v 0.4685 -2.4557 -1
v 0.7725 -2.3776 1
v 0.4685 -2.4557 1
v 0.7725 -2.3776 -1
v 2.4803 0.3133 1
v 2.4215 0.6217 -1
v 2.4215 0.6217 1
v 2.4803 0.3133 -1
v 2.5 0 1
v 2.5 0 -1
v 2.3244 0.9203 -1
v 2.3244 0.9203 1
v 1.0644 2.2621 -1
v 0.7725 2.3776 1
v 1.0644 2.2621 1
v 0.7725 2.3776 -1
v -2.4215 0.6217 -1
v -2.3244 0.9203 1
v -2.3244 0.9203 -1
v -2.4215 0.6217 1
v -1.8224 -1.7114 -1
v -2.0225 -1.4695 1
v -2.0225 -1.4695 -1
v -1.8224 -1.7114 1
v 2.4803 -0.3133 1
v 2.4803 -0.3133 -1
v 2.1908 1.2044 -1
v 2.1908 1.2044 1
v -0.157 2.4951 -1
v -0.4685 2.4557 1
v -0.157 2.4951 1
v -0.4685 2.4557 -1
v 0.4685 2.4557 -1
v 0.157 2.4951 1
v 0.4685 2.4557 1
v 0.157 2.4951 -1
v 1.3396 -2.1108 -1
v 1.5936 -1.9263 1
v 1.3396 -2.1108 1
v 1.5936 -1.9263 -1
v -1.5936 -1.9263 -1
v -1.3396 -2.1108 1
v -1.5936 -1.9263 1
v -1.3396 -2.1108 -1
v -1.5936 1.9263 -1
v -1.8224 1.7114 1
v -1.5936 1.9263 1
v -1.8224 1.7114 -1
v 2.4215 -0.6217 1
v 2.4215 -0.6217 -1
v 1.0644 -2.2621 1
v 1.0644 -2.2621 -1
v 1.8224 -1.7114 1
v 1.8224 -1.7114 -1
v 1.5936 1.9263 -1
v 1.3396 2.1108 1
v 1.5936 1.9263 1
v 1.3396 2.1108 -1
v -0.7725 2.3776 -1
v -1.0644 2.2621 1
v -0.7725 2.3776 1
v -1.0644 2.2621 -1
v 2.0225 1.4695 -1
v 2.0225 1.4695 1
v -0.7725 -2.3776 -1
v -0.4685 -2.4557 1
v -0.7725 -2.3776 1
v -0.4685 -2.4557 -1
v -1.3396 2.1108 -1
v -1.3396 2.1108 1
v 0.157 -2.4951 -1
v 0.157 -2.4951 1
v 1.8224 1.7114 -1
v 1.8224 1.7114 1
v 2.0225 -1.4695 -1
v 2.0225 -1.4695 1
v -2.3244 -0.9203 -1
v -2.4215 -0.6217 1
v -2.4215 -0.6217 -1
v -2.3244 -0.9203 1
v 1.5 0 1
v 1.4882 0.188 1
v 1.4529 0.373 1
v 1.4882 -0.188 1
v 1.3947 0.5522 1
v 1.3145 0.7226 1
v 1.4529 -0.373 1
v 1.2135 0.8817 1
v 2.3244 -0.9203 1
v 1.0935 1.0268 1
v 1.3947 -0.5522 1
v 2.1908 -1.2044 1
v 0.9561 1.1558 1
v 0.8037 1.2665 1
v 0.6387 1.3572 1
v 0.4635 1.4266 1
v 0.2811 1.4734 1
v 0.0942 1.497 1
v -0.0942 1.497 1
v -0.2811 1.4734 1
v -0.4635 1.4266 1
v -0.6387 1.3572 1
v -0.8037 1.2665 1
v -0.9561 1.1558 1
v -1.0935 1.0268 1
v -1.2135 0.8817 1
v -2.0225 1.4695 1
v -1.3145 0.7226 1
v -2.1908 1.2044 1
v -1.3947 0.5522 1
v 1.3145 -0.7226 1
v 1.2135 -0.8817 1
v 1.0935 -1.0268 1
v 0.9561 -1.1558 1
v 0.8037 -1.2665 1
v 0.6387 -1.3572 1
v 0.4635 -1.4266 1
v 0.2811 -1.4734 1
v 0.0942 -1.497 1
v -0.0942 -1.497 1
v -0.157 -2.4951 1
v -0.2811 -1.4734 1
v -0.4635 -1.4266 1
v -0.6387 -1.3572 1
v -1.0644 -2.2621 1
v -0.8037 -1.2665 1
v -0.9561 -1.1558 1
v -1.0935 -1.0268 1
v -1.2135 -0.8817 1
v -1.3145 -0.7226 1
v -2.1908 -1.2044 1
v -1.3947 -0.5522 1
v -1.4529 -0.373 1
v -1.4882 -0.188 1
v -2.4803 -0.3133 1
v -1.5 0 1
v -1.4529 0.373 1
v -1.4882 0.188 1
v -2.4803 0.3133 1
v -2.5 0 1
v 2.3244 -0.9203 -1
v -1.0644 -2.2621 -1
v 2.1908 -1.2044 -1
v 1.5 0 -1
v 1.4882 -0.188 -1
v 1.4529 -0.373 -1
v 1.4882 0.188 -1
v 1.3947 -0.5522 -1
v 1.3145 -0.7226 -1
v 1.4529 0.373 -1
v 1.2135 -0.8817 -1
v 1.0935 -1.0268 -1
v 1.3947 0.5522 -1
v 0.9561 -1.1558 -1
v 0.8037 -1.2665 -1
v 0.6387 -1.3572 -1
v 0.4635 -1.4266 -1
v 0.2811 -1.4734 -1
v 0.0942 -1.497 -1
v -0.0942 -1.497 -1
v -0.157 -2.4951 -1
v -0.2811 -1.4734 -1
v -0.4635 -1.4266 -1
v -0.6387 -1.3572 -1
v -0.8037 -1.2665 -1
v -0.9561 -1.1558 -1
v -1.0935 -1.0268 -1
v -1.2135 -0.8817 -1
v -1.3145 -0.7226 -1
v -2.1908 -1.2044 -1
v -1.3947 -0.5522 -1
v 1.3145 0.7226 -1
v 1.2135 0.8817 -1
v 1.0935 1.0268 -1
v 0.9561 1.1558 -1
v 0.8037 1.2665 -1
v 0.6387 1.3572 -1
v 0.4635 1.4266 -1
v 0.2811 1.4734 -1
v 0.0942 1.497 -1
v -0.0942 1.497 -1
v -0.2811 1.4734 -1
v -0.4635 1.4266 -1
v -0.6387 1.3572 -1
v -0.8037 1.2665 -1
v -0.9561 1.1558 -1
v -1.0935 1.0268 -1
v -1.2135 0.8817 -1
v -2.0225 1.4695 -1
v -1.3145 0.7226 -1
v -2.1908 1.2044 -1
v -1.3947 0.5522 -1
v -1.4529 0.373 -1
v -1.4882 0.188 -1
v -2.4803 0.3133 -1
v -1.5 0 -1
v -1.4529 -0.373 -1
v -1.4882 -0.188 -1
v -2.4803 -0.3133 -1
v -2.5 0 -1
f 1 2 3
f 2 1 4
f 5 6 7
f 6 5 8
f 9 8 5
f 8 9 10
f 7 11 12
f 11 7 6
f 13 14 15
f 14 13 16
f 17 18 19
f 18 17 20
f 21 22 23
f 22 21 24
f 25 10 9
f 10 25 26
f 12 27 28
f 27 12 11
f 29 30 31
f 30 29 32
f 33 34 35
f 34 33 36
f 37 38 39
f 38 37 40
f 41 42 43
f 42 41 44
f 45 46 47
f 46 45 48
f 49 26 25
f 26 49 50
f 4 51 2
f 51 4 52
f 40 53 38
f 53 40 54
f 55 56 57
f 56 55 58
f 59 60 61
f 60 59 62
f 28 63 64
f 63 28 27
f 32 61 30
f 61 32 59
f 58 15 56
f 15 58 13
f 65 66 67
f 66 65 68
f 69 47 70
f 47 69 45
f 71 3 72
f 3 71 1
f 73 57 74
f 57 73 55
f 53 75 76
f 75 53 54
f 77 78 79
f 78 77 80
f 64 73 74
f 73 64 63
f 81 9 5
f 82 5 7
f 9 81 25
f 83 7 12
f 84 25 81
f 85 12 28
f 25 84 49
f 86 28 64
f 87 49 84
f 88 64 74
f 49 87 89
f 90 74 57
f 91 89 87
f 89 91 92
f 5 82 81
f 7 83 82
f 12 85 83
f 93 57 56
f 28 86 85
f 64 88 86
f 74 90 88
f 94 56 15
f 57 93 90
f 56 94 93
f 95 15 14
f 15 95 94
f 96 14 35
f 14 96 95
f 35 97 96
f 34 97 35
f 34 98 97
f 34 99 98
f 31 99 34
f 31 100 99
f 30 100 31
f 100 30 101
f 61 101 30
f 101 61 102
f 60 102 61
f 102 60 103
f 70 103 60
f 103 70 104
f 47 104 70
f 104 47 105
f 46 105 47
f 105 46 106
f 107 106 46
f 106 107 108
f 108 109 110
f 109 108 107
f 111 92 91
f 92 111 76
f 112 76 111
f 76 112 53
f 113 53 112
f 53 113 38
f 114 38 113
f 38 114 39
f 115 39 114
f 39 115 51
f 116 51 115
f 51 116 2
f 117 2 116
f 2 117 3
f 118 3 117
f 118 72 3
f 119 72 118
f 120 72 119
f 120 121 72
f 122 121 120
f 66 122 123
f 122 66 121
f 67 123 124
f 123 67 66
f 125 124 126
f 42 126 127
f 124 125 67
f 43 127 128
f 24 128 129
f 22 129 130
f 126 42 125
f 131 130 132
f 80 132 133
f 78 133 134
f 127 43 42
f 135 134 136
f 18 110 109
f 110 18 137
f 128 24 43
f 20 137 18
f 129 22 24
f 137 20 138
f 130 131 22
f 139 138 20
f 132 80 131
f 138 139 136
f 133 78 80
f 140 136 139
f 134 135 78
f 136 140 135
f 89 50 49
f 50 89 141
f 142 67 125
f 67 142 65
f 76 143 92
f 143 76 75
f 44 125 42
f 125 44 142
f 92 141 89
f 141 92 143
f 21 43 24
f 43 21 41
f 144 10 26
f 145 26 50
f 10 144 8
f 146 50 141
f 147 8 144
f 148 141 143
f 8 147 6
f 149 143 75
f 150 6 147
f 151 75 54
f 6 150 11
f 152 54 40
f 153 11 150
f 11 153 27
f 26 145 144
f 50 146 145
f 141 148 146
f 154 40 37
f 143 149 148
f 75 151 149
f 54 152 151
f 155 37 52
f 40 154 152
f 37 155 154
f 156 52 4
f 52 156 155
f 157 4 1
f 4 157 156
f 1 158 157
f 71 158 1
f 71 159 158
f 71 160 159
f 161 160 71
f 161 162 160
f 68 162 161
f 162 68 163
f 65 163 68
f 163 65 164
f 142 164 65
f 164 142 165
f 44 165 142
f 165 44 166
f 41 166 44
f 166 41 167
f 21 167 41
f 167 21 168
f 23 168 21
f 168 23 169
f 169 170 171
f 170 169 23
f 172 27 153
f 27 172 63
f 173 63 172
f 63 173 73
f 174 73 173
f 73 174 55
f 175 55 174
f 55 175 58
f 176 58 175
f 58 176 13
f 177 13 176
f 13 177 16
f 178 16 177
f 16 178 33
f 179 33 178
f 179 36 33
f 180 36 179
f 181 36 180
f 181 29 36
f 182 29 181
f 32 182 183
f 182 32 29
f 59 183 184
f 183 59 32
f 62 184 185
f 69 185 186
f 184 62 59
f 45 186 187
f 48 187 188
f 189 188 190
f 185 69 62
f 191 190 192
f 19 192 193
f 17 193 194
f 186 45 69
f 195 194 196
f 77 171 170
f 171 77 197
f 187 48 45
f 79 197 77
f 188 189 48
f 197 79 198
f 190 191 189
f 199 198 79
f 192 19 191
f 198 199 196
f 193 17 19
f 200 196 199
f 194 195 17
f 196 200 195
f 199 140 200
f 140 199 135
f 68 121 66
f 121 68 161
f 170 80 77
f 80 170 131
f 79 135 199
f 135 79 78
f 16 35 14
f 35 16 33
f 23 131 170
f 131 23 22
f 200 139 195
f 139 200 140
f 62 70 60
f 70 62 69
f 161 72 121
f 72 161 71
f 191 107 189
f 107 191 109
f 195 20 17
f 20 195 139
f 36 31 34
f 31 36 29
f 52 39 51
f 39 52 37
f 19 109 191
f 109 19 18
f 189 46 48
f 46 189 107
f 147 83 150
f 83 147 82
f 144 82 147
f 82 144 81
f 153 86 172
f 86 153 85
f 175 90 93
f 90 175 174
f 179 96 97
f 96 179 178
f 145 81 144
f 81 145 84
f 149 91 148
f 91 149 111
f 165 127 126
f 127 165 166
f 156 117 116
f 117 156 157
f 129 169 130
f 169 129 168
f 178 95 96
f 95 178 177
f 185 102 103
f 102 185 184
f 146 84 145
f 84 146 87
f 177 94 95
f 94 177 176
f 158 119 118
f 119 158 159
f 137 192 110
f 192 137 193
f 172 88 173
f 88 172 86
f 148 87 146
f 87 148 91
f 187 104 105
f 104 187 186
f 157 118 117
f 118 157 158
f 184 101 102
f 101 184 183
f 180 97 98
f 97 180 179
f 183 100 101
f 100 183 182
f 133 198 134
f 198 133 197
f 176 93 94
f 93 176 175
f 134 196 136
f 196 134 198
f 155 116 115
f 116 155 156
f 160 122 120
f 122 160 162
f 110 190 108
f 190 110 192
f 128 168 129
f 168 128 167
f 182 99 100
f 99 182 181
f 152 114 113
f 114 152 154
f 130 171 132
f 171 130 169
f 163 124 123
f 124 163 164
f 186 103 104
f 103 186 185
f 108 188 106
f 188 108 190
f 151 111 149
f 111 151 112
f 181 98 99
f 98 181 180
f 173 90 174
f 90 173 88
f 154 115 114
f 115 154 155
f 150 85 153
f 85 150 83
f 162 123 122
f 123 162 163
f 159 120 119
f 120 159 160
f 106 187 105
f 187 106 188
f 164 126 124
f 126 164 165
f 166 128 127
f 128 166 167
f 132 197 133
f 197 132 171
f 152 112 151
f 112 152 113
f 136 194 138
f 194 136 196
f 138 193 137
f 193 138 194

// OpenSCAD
$fn = 50;


difference() {
	union() {
		translate(v = [0, 0, -1.0000000000]) {
			cylinder(h = 2, r = 2.5000000000);
		}
	}
	union() {
		translate(v = [0, 0, -100.0000000000]) {
			cylinder(h = 200, r = 1.5000000000);
		}
	}
}
